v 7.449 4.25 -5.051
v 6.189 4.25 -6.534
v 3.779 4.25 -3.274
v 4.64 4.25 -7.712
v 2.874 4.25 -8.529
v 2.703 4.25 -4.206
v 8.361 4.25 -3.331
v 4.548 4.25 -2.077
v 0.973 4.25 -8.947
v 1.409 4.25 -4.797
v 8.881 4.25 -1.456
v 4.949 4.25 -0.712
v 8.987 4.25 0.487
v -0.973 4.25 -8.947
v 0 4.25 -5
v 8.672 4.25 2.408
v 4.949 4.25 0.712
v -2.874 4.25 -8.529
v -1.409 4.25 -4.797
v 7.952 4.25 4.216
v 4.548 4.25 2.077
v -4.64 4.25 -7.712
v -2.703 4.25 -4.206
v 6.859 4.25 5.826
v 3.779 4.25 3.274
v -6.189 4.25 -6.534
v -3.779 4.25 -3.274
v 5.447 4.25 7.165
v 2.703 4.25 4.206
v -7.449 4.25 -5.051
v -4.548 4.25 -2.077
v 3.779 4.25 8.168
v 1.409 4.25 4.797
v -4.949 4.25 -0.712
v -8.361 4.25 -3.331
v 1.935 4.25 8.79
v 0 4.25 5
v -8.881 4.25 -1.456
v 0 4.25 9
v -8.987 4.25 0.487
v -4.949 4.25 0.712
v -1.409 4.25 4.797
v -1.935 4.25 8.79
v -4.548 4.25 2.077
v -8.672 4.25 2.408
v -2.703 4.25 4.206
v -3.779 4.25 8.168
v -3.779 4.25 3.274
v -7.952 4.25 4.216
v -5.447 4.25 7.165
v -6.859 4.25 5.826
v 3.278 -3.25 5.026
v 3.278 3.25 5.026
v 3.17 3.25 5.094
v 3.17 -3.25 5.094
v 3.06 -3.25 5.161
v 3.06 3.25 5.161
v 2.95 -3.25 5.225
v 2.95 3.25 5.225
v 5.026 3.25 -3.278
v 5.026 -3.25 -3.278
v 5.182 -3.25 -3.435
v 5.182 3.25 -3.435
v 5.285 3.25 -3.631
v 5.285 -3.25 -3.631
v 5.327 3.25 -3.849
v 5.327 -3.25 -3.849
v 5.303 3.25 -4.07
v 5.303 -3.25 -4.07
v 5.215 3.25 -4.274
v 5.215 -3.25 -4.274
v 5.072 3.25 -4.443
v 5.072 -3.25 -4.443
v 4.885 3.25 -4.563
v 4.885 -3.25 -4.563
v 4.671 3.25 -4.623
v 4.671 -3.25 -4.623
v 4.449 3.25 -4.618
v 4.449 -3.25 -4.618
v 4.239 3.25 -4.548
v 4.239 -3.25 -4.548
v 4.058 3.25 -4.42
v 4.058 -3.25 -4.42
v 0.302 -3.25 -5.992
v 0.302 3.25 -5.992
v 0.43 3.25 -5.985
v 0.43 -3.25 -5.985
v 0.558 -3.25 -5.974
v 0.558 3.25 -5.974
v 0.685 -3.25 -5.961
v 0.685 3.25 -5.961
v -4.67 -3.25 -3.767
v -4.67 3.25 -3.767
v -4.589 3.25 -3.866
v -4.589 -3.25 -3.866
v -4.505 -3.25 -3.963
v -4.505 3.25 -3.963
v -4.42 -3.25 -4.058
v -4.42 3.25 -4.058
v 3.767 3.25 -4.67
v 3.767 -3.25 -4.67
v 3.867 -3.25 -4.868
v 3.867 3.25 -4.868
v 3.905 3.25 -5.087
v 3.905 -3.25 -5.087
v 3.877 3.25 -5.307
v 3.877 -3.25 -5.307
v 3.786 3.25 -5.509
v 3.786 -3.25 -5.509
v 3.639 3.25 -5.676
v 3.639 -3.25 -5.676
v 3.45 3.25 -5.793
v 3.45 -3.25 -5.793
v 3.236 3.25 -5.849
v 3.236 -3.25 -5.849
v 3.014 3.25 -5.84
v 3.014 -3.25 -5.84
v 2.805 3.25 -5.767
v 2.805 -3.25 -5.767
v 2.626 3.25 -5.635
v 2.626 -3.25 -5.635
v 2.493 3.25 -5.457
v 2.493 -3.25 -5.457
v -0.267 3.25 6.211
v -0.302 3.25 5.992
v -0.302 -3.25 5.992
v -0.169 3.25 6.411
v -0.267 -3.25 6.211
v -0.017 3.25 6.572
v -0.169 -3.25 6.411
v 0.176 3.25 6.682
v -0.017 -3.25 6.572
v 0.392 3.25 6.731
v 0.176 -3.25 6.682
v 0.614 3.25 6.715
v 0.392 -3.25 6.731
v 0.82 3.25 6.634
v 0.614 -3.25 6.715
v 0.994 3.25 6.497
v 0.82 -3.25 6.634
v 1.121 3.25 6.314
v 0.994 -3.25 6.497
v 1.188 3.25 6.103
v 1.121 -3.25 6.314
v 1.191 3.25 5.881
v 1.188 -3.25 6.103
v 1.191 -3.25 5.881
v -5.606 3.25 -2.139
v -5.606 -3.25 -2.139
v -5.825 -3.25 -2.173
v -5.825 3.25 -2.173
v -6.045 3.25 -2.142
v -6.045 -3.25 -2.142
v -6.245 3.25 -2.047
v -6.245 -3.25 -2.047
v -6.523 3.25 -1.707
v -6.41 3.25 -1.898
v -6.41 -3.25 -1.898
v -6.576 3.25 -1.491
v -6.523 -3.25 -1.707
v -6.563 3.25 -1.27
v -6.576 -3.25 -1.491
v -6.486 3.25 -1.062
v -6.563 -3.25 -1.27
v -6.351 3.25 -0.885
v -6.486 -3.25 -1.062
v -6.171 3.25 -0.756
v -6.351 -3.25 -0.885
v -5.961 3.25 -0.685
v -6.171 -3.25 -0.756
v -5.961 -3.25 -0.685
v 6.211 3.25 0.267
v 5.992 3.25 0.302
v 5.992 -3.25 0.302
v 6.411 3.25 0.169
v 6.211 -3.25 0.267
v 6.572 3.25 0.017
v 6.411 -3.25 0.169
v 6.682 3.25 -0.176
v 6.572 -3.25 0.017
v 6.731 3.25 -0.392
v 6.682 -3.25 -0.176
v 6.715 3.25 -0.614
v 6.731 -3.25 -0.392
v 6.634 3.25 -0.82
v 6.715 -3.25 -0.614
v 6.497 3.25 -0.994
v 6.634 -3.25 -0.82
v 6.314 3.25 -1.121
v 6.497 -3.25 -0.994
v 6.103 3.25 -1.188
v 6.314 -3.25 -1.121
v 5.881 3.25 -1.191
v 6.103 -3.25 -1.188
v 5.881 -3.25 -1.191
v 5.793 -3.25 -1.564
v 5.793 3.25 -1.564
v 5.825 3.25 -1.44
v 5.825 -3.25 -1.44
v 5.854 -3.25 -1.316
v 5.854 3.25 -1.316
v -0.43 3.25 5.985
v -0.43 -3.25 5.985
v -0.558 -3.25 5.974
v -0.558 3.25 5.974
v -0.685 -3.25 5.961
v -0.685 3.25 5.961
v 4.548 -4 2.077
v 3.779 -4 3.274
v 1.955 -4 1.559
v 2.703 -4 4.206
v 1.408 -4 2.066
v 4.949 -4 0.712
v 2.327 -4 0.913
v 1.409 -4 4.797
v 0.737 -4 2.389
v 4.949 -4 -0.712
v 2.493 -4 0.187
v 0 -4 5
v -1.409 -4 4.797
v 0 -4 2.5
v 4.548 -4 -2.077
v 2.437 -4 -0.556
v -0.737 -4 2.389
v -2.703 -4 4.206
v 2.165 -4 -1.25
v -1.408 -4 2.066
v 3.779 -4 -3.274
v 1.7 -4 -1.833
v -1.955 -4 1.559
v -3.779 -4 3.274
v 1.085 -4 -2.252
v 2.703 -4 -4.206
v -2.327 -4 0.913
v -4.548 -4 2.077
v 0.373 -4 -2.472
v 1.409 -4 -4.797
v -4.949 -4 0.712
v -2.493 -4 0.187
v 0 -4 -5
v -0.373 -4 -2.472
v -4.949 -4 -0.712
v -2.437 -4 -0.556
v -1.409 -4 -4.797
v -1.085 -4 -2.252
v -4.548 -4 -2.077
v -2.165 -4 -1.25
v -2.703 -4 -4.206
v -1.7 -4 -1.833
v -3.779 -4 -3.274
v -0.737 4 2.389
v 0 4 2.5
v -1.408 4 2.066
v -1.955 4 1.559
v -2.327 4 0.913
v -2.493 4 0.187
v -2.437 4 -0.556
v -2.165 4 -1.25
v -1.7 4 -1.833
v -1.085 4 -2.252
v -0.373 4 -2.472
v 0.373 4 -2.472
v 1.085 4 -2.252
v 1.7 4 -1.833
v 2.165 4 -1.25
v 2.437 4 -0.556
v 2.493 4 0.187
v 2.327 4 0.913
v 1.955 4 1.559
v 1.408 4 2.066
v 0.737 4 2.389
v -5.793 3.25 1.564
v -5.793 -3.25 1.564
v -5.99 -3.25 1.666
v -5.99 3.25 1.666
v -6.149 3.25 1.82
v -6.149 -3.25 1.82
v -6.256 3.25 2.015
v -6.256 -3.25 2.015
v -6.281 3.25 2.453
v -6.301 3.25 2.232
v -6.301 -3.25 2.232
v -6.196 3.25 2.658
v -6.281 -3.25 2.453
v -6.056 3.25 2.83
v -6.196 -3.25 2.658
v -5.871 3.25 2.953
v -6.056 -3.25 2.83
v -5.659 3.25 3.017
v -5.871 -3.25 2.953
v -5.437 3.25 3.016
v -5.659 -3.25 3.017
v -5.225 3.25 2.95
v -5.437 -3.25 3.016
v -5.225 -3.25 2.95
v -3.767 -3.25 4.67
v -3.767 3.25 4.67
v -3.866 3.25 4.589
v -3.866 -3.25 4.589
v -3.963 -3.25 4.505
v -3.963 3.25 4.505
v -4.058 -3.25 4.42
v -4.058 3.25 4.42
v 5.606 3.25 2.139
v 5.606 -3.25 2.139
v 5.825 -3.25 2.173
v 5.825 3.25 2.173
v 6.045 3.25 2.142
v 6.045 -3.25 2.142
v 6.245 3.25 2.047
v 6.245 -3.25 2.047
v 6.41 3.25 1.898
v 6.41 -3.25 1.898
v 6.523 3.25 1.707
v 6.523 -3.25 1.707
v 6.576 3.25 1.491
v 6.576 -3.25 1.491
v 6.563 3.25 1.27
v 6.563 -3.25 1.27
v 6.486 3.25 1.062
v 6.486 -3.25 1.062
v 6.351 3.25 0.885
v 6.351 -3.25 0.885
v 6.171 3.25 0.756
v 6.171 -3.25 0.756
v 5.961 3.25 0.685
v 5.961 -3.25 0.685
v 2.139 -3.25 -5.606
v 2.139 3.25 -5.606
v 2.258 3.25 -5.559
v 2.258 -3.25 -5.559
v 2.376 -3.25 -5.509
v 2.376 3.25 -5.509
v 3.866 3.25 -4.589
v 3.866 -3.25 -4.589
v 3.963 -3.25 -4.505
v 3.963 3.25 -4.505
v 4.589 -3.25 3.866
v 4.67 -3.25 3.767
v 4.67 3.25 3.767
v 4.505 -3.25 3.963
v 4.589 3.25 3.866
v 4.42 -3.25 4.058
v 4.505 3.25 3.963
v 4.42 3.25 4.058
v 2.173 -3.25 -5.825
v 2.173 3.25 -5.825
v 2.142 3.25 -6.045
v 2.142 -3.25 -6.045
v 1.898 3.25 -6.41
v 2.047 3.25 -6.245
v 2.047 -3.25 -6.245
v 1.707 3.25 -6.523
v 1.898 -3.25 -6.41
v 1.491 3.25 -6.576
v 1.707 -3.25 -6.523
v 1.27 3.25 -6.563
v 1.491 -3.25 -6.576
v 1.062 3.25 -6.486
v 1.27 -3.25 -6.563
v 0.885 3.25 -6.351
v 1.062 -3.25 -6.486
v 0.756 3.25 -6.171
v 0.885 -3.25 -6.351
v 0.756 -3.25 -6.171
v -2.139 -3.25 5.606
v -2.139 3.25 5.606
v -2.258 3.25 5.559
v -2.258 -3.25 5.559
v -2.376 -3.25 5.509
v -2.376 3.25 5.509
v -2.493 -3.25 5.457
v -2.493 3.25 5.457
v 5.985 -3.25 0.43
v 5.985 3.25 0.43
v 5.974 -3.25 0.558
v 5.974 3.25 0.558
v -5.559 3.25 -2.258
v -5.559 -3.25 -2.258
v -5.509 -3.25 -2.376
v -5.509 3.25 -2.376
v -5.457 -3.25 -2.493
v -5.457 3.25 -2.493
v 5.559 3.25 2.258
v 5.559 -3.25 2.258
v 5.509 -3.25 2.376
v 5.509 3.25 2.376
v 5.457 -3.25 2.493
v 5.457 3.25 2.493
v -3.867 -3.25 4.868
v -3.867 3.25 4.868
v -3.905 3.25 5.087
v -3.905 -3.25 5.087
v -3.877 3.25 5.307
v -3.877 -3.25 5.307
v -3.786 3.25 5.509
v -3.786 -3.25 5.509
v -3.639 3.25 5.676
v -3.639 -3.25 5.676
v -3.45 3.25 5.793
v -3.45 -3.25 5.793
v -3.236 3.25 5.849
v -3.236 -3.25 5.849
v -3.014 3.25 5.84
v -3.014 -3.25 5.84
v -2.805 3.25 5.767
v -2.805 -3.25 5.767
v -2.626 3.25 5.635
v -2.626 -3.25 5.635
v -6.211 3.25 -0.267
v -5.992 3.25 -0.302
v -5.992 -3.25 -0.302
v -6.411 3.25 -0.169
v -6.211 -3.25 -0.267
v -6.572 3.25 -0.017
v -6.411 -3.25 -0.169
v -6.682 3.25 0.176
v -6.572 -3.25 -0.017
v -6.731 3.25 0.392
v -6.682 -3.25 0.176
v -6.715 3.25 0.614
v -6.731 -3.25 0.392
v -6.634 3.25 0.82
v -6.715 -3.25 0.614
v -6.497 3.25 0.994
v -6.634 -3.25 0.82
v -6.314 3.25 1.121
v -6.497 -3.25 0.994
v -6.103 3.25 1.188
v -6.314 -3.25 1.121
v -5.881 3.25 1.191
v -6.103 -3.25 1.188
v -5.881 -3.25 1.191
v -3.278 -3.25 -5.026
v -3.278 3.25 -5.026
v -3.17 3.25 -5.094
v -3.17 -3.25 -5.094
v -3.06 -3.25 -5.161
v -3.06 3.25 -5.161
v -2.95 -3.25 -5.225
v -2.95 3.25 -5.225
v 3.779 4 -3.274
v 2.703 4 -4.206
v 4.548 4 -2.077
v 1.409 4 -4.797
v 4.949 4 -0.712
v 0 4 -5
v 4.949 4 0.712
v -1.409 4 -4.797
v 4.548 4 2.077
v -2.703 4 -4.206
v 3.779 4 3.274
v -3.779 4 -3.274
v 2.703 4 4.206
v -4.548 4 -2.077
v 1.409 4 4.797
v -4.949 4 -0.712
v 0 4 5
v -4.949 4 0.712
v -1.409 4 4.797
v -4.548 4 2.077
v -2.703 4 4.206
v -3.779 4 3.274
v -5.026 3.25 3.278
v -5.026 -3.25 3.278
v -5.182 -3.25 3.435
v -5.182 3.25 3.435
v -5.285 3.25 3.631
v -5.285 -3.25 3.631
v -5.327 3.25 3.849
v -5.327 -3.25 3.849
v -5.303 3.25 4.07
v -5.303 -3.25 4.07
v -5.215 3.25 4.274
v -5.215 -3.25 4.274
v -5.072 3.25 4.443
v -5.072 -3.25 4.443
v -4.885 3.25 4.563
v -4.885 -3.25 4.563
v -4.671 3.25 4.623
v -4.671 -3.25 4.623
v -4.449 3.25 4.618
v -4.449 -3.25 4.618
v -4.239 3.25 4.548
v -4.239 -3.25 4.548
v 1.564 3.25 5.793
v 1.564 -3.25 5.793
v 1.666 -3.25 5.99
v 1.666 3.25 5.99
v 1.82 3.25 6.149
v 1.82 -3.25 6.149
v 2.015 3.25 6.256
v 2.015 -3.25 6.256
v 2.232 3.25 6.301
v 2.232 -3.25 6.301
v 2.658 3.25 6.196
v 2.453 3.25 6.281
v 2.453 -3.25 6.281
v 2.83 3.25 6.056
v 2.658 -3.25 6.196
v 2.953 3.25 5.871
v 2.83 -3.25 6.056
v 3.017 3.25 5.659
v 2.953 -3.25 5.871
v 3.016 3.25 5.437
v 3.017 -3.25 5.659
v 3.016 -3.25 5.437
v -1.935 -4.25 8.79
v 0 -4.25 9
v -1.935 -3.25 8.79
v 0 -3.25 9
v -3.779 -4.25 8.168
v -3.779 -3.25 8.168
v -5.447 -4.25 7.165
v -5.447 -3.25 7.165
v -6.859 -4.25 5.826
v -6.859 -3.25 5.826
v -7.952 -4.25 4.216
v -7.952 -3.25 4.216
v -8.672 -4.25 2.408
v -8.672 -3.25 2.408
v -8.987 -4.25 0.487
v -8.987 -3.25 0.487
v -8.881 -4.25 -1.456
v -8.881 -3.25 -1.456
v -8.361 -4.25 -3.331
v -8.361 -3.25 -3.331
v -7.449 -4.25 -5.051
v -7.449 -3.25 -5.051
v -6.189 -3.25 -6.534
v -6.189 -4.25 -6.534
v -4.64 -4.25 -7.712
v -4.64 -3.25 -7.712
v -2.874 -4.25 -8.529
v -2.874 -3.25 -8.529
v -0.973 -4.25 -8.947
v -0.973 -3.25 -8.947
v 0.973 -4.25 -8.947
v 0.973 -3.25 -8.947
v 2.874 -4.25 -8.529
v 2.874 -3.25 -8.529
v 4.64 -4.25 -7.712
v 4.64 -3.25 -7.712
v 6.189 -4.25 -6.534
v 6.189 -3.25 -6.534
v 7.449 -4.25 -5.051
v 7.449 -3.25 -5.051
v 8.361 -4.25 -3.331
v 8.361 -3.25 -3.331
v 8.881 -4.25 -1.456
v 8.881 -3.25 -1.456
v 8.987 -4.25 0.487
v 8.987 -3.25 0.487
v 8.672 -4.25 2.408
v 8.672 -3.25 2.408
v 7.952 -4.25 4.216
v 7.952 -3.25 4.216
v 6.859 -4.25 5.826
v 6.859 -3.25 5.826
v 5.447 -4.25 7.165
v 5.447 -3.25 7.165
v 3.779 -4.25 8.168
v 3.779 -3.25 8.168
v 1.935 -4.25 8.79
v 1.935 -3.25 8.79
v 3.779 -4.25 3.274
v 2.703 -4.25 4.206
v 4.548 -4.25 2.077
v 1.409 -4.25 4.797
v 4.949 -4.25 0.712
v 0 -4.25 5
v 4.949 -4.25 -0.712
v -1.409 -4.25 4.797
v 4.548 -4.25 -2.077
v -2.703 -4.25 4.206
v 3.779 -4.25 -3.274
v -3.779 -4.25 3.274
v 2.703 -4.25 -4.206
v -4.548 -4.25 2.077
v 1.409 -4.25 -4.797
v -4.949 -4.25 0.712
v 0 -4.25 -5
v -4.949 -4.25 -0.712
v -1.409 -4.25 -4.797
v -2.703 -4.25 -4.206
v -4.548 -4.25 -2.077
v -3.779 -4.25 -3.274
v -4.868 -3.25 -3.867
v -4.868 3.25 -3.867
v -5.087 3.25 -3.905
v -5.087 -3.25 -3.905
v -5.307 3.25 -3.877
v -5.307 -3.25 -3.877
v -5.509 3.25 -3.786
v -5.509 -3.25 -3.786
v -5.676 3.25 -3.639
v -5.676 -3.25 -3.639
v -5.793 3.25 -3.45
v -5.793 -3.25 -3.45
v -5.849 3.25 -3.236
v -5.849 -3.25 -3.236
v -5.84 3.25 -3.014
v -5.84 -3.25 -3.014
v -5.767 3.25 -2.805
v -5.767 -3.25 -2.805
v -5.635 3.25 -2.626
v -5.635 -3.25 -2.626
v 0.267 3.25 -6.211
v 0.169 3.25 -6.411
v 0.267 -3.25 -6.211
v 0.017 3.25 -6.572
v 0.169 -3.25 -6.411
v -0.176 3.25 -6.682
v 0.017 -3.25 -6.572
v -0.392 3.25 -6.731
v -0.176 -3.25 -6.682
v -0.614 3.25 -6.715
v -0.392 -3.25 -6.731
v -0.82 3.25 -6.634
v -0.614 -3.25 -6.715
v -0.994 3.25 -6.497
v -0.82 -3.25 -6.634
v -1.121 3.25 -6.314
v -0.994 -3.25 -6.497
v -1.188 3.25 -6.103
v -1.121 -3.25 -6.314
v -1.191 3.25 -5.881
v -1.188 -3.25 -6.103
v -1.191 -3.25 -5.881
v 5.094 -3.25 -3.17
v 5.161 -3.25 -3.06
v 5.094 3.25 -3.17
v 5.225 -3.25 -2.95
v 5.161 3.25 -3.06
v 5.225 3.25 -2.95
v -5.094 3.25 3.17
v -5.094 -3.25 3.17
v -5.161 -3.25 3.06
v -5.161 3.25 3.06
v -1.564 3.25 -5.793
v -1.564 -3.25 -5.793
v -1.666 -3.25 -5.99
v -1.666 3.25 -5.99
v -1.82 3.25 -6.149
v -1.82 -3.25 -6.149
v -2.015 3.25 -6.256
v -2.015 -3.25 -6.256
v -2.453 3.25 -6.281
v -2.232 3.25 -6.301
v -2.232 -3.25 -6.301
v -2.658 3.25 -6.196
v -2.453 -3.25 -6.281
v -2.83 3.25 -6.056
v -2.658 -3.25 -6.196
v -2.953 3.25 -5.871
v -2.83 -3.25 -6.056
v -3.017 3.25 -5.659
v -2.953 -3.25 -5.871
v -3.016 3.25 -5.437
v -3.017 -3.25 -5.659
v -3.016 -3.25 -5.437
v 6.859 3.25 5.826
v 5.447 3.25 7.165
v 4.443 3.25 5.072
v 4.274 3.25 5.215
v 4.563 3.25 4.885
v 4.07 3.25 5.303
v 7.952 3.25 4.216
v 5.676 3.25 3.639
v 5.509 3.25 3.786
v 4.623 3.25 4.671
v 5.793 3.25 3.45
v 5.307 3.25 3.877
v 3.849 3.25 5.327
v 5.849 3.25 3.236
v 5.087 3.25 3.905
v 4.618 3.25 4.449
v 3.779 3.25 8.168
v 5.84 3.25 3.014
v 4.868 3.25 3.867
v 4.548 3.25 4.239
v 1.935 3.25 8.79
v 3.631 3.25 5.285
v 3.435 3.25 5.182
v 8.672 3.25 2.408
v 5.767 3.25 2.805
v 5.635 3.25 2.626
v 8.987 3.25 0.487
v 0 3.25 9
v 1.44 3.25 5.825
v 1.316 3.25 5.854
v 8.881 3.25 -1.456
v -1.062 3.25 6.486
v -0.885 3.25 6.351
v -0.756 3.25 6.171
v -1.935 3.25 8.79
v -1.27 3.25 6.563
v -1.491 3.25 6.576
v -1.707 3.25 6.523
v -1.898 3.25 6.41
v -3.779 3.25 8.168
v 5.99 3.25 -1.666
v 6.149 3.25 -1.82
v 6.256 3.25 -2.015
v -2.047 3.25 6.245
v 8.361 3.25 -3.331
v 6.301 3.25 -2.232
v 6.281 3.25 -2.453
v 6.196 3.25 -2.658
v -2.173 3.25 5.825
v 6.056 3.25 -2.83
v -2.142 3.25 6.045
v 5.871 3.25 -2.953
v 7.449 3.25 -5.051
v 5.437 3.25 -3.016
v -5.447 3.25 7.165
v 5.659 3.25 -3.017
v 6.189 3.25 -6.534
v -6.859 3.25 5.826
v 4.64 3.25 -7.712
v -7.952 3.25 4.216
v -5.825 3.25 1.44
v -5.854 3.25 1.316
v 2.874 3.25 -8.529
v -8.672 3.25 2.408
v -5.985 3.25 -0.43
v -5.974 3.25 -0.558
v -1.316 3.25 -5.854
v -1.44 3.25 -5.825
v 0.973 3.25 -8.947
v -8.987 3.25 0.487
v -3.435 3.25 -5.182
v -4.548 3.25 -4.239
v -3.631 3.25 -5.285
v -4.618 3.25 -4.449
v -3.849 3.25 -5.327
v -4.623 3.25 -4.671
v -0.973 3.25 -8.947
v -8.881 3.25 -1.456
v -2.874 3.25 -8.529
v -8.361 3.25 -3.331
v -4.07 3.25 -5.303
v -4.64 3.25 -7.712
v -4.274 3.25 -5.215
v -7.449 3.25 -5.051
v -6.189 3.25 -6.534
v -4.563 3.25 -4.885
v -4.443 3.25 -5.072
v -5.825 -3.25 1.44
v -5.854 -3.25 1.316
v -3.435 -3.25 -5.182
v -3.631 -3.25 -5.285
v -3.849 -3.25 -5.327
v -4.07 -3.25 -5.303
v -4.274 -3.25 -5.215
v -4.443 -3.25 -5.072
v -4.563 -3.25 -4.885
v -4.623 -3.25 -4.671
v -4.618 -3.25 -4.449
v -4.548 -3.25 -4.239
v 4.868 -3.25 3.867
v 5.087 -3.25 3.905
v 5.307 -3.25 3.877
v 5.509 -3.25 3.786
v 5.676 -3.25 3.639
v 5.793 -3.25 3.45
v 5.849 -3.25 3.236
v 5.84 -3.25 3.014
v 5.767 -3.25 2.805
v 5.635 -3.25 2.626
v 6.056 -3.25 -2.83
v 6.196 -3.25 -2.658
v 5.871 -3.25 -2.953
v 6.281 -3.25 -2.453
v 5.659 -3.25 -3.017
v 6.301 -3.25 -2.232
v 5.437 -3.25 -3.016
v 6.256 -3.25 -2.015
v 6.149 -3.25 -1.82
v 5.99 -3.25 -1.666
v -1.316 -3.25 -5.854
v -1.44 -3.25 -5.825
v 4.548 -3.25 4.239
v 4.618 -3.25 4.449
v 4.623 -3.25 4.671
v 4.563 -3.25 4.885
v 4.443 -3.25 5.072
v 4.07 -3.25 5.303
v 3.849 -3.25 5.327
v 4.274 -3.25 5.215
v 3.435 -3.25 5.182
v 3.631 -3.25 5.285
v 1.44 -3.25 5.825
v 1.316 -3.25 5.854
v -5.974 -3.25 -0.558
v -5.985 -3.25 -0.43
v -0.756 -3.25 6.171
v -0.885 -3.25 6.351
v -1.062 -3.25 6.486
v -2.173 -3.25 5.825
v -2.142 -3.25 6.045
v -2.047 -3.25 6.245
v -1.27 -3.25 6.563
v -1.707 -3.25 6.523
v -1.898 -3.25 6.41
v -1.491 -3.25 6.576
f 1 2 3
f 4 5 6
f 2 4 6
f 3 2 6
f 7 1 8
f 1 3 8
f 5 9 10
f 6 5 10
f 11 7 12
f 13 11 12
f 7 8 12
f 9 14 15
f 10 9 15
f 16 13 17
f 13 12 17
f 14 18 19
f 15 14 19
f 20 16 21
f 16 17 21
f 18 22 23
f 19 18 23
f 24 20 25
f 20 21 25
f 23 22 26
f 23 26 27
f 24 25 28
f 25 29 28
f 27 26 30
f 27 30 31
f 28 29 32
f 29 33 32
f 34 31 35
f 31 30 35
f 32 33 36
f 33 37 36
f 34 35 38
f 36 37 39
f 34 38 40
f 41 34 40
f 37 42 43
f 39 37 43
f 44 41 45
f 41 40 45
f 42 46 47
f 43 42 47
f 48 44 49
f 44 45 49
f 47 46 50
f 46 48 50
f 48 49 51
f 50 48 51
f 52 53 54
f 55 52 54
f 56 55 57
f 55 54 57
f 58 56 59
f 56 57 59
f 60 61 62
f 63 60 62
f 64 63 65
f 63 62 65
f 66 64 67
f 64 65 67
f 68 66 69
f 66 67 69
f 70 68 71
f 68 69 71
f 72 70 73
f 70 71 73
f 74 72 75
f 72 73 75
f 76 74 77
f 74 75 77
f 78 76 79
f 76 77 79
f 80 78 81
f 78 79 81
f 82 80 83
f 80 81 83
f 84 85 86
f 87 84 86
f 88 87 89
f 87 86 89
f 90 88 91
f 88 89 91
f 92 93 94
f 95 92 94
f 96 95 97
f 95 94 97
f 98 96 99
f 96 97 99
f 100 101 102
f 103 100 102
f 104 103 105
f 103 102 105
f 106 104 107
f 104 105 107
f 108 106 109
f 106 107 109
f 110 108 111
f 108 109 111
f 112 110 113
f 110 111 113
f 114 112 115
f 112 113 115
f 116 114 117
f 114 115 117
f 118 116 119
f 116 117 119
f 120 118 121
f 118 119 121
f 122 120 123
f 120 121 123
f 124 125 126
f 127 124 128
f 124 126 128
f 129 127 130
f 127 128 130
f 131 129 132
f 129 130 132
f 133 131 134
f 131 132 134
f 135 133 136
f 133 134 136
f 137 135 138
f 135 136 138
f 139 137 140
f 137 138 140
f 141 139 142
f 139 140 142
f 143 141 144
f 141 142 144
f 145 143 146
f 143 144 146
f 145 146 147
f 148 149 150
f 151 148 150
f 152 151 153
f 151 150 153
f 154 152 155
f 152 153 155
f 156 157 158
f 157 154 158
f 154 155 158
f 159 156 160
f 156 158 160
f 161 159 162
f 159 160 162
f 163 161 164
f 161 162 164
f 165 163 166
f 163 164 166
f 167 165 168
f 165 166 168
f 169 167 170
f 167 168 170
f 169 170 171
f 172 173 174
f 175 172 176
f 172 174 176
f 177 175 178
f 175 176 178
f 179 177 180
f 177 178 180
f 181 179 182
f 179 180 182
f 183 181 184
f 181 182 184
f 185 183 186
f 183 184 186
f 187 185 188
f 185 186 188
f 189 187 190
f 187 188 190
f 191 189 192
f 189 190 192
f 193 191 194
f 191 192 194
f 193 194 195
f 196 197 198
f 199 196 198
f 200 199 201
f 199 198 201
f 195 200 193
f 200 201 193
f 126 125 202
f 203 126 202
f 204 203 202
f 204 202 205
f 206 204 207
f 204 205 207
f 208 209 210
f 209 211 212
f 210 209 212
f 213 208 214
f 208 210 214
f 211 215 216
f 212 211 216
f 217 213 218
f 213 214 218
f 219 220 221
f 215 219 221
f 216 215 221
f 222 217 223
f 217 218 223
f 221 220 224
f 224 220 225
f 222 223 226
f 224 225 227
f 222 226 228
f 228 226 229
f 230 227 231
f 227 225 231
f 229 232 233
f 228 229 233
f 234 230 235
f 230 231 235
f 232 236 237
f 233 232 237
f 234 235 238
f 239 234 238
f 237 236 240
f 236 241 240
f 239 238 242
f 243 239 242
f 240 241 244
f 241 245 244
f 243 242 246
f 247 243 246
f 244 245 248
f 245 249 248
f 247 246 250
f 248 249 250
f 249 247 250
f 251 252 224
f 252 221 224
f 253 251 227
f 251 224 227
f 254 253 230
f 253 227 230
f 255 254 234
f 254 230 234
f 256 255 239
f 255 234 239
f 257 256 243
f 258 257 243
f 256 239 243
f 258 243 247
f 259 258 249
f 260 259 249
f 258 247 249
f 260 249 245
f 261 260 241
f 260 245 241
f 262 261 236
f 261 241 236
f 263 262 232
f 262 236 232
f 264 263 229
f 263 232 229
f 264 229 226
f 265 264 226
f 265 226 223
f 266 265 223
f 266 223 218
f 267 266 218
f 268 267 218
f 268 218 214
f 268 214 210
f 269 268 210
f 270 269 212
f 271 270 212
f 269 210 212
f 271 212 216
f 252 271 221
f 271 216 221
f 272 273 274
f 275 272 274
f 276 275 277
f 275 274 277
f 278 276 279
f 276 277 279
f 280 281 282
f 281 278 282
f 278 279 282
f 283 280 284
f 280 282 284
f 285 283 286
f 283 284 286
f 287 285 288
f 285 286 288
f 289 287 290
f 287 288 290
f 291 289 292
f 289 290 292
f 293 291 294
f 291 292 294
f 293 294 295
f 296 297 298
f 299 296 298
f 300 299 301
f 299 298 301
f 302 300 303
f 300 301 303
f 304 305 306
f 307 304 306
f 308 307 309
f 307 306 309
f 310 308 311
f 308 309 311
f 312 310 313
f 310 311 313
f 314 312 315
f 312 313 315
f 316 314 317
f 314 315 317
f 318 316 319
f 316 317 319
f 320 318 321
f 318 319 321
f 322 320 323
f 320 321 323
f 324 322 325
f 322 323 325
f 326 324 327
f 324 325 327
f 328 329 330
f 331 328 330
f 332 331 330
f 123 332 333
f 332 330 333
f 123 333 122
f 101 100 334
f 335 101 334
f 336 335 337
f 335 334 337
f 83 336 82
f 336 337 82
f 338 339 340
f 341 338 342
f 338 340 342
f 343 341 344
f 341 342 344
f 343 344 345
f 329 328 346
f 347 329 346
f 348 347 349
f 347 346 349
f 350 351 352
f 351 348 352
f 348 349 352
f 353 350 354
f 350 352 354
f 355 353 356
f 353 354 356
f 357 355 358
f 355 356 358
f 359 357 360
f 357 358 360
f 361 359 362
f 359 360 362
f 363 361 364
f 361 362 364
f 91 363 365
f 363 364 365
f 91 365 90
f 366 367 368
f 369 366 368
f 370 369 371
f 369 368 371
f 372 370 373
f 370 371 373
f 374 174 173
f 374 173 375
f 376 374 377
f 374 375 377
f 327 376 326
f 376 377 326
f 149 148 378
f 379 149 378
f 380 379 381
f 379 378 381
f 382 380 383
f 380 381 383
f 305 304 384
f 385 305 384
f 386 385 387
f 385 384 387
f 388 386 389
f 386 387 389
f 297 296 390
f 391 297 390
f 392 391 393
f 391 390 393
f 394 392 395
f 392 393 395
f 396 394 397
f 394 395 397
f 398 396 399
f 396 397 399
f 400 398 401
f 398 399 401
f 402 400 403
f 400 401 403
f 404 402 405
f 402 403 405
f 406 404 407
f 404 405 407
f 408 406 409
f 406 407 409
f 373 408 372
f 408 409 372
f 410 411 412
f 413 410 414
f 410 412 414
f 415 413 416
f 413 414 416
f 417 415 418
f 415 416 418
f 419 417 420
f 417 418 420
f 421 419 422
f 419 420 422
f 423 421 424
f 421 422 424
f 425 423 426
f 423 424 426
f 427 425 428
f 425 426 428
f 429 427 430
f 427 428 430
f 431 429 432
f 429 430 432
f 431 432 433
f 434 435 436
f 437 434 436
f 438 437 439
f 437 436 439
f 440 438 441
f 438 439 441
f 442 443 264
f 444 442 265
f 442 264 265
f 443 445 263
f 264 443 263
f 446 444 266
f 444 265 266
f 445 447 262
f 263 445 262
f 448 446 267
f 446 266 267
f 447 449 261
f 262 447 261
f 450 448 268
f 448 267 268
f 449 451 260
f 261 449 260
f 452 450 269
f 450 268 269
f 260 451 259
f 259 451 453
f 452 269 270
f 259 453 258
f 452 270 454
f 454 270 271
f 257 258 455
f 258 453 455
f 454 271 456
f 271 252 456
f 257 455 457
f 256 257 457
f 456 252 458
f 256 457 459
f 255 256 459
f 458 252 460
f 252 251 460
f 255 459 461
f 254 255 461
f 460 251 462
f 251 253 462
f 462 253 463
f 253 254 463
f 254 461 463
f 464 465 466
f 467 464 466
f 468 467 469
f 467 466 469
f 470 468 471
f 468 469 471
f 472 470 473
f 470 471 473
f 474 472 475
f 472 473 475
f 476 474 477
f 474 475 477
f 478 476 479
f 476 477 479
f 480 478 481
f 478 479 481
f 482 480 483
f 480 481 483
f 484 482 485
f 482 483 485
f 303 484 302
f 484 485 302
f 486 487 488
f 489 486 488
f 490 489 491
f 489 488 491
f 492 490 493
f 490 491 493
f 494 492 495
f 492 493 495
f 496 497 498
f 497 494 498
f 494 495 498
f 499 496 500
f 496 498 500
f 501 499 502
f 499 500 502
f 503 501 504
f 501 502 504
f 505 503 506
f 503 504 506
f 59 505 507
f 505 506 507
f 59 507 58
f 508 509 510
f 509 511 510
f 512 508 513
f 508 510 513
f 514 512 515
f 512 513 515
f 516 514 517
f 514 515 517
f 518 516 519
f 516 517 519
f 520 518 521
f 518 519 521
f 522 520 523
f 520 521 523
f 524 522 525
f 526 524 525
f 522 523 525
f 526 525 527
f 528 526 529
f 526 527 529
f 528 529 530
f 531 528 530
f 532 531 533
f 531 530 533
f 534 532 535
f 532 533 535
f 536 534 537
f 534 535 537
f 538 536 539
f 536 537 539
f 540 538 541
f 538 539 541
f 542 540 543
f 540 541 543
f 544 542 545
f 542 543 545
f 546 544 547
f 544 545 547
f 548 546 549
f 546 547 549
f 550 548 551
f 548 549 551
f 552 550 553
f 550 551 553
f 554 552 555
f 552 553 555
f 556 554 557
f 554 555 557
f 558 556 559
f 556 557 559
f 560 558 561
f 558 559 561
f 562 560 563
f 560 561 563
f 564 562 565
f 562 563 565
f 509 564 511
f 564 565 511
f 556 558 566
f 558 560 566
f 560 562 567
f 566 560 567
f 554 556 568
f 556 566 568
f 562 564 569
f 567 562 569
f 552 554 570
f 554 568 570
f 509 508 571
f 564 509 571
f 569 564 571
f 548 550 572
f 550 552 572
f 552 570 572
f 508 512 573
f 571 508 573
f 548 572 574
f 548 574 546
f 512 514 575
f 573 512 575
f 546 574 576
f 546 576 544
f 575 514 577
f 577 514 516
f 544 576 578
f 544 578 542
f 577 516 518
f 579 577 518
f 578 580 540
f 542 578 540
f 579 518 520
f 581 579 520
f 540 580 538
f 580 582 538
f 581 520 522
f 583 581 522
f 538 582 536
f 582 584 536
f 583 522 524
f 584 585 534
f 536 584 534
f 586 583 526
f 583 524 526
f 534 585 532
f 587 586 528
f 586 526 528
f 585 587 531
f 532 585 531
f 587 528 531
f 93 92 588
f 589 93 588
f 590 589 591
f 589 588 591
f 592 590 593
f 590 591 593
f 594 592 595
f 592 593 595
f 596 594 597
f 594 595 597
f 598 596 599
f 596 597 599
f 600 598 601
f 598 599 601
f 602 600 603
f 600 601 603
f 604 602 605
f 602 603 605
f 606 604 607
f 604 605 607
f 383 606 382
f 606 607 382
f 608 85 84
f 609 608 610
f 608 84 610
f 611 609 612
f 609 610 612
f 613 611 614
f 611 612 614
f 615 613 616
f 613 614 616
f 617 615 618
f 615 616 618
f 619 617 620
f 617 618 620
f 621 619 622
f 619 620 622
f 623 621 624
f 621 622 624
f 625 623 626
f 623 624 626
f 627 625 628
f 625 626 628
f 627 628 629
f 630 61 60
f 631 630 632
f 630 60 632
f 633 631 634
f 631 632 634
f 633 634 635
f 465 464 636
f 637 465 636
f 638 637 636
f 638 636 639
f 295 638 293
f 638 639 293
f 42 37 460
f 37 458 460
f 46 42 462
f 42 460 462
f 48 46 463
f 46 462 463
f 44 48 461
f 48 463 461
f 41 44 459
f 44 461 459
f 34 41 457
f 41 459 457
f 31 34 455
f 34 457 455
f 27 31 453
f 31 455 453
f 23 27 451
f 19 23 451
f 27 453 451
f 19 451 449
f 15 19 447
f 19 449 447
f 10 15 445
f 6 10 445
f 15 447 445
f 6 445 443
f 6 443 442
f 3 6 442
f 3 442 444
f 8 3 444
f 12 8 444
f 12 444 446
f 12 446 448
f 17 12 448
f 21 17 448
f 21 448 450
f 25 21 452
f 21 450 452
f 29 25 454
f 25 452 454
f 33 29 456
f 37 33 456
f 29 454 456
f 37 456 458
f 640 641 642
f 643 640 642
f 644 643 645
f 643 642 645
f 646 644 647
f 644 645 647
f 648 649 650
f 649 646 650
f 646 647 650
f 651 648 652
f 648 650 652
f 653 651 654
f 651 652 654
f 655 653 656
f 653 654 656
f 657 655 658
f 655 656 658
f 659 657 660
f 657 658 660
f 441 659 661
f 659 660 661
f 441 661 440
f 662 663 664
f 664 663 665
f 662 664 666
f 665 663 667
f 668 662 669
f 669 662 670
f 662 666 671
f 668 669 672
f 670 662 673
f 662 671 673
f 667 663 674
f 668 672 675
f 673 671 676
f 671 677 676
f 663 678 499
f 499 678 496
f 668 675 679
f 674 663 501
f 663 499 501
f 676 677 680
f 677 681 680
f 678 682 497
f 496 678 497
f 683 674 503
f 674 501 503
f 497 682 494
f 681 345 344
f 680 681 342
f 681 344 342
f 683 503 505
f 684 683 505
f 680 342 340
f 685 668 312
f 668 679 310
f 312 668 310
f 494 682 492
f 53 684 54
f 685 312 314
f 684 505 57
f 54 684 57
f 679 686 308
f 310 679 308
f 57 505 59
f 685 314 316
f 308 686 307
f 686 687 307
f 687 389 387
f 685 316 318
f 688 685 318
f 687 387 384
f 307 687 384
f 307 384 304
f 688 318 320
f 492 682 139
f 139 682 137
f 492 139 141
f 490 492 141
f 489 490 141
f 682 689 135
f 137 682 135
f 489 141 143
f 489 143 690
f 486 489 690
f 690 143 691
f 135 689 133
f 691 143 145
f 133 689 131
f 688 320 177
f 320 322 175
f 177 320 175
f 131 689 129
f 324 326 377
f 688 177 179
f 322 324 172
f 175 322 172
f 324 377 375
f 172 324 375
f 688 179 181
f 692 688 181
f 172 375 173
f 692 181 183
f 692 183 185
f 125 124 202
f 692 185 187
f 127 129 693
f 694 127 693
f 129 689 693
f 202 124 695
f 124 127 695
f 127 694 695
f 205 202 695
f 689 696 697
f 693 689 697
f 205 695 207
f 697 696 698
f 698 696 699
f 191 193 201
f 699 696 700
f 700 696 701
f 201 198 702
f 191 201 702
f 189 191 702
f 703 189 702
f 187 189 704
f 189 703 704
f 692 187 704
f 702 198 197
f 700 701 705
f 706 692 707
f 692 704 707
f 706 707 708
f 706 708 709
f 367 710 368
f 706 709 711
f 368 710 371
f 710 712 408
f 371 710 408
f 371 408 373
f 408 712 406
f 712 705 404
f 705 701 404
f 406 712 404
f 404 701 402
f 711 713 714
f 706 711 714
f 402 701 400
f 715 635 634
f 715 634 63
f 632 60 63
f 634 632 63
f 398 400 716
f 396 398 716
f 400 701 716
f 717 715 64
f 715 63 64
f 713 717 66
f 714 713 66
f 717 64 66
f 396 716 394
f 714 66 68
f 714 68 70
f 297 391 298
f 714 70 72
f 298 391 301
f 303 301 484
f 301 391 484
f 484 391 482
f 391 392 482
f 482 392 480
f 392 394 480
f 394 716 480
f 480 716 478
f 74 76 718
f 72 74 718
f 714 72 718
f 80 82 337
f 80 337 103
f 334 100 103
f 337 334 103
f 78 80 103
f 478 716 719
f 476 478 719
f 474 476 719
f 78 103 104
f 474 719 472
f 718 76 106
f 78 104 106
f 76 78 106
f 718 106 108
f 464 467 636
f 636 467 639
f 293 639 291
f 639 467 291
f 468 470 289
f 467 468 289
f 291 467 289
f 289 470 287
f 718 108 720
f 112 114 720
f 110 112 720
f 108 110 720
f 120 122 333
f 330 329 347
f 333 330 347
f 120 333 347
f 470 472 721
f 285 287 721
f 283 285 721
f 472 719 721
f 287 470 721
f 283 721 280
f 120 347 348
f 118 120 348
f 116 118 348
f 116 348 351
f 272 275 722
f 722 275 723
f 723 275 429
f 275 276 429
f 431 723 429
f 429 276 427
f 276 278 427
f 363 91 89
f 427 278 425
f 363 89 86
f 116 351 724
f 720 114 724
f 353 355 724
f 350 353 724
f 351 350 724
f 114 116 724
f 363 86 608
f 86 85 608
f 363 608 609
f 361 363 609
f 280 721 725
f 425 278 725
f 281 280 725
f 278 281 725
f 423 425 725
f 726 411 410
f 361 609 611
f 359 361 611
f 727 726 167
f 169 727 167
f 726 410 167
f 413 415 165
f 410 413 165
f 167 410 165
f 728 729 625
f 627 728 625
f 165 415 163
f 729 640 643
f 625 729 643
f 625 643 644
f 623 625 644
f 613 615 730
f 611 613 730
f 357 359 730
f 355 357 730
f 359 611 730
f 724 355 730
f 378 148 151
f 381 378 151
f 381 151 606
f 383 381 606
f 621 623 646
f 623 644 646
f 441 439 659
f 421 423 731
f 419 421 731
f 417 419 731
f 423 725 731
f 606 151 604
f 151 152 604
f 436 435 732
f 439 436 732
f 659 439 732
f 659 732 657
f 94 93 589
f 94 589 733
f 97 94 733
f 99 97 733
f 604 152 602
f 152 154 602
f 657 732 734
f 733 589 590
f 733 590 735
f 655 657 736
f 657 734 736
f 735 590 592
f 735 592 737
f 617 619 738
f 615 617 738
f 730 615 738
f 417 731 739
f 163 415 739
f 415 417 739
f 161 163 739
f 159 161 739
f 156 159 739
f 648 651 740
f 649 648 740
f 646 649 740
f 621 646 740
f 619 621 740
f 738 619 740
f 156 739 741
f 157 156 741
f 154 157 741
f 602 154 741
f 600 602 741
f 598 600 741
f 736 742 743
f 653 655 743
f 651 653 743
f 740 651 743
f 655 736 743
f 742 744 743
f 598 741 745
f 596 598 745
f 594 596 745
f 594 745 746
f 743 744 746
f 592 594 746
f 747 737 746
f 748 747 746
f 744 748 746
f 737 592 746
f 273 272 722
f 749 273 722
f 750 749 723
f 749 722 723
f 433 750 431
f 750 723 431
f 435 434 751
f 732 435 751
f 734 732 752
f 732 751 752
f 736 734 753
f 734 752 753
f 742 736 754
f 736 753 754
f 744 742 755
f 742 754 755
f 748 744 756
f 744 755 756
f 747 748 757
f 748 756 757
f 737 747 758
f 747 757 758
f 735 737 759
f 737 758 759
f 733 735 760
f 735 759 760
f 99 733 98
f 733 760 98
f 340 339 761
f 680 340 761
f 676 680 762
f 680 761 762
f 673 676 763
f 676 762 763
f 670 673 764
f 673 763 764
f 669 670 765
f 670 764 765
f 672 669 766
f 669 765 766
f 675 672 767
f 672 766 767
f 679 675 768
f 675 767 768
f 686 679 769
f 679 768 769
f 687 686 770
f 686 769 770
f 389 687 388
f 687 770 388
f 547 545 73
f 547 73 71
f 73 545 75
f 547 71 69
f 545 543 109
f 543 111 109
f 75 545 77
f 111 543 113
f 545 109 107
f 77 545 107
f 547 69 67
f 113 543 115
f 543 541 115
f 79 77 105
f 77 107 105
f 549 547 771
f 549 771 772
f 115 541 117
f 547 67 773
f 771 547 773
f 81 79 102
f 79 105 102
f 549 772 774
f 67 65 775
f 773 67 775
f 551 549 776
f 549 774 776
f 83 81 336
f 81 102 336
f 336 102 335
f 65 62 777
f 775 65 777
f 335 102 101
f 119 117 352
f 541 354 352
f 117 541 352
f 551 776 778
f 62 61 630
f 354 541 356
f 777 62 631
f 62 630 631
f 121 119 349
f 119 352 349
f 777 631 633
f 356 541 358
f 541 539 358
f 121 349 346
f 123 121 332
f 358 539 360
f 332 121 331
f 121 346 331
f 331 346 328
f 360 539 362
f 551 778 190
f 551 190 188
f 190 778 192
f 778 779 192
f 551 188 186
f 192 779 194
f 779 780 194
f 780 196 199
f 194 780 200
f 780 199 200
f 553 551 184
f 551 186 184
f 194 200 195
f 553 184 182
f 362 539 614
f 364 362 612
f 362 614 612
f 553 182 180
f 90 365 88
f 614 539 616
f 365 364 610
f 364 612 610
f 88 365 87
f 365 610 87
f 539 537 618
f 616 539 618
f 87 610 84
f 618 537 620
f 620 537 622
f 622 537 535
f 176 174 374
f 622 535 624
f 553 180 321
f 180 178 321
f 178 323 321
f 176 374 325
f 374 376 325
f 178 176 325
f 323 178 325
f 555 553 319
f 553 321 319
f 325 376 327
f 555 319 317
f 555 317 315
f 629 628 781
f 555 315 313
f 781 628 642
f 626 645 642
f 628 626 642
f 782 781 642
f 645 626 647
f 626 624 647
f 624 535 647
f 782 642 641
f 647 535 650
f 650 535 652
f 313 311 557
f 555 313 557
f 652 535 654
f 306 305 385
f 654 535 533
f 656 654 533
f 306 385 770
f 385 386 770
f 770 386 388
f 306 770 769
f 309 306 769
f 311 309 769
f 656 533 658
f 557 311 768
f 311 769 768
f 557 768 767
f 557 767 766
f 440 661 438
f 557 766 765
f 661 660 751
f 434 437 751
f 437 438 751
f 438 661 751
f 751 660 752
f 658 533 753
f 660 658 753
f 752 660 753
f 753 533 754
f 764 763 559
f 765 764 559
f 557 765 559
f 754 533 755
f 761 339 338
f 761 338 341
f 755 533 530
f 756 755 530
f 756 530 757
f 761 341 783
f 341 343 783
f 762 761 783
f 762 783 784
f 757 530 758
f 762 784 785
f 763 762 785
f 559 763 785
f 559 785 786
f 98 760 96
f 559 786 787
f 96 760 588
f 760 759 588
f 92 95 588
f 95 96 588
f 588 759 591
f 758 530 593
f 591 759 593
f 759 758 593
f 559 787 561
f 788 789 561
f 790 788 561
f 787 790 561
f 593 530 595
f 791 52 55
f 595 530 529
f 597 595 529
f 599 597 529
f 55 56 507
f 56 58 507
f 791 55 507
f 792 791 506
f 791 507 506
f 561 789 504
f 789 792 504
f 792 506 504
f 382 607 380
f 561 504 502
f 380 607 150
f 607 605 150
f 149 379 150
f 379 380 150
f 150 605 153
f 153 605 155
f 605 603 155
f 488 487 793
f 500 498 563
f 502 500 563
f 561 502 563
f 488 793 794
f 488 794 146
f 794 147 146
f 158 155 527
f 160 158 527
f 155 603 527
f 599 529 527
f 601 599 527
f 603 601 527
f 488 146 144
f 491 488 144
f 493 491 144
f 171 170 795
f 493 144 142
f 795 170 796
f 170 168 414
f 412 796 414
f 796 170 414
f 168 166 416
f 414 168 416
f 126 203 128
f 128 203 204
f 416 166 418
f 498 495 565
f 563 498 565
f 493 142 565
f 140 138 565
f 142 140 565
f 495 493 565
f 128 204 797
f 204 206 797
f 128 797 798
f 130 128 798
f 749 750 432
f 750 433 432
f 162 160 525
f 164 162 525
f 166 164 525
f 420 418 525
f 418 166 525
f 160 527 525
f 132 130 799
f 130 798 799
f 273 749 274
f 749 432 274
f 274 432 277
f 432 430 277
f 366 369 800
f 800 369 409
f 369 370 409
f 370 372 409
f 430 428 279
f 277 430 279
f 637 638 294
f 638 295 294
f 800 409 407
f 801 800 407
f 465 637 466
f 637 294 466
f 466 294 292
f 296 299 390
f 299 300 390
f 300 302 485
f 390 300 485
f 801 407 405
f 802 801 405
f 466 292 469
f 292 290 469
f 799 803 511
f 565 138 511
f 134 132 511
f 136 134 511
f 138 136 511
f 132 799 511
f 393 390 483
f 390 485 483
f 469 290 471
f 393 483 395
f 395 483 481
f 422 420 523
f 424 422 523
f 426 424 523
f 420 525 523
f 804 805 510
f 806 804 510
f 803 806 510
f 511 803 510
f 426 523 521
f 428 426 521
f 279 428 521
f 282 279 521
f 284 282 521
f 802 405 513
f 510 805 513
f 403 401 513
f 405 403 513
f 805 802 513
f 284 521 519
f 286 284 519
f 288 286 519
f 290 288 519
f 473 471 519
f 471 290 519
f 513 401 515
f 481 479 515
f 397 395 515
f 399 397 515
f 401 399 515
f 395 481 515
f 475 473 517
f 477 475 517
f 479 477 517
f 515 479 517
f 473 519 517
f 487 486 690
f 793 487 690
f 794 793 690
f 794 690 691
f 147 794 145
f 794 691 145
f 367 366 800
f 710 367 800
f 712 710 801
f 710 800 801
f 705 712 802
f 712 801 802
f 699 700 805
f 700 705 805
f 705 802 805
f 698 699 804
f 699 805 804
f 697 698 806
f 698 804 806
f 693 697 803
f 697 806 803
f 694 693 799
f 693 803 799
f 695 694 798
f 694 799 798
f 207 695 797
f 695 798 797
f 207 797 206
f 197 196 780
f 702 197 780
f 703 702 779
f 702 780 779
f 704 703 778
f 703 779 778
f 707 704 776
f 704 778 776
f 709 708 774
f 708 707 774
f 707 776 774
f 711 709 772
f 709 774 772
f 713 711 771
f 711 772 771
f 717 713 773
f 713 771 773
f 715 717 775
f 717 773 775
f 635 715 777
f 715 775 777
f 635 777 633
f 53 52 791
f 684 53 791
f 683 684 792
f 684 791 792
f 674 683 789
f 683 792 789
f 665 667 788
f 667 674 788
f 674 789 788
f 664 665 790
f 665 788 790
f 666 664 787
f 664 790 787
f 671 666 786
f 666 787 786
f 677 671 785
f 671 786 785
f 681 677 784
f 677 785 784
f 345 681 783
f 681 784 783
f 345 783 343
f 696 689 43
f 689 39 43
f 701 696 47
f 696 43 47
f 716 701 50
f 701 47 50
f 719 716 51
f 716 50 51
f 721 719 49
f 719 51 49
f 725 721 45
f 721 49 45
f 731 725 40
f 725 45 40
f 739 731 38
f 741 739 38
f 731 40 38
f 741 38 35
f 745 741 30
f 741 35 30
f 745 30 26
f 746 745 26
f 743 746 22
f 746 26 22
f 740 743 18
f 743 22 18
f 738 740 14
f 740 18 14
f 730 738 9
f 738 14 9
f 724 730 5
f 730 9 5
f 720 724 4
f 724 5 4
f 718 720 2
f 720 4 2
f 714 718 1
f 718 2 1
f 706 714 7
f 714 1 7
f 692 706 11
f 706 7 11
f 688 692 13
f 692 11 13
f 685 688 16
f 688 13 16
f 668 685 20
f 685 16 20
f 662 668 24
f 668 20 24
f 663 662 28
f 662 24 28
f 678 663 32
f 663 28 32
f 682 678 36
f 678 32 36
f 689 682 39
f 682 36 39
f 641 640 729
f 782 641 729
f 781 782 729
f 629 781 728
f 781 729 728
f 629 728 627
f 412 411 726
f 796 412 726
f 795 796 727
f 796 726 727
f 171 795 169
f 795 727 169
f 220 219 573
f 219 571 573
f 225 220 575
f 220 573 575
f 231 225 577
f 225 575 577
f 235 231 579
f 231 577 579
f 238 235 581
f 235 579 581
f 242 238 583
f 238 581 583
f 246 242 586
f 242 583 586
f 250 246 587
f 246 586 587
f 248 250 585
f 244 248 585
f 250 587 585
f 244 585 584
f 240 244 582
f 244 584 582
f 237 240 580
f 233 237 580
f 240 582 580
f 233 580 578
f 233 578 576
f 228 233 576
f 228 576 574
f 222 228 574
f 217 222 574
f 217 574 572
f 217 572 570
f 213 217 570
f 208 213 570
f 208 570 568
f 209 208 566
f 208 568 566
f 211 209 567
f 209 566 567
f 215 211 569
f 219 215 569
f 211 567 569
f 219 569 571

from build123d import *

# Parameters (mm, degrees)
SKETCH_2_R               = 0.75
EXTRUDE_1_DEPTH          = 7
PATTERN_CIRCULAR_1_COUNT = 20


with BuildPart() as part:
    # 草图1 → 旋转1 (revolve)
    with BuildSketch(Plane.XY, mode=Mode.PRIVATE) as revolve_1_sk:
        Polygon((-9, 4.25), (-5, 4.25), (-5, 4), (-2.5, 4), (-2.5, -4), (-5, -4), (-5, -4.25), (-9, -4.25), (-9, -3.25), (-6, -3.25), (-6, 3.25), (-9, 3.25), align=None)
    revolve(revolve_1_sk.sketch.rotate(Axis((0, 36.523336922, 0), (0, -1, 0)), 270), axis=Axis((0, 36.523336922, 0), (0, -1, 0)))

    # 草图2 → 凸台-拉伸1 (add)
    with BuildSketch(Plane(origin=(0, -3.25, 0), x_dir=(1, 0, 0), z_dir=(0, 1, 0))):
        with Locations((3.878999087, -4.577484689)):
            Circle(SKETCH_2_R)
    extrude_1 = extrude(amount=EXTRUDE_1_DEPTH)

    # 阵列(圆周)1: 凸台-拉伸1 ×20 about axis
    pattern_circular_1_axis = Axis((0, 0, 0), (0, 1, 0))
    for i in range(1, PATTERN_CIRCULAR_1_COUNT):
        add(extrude_1.rotate(pattern_circular_1_axis, i * 360 / PATTERN_CIRCULAR_1_COUNT))


solid = part.part
